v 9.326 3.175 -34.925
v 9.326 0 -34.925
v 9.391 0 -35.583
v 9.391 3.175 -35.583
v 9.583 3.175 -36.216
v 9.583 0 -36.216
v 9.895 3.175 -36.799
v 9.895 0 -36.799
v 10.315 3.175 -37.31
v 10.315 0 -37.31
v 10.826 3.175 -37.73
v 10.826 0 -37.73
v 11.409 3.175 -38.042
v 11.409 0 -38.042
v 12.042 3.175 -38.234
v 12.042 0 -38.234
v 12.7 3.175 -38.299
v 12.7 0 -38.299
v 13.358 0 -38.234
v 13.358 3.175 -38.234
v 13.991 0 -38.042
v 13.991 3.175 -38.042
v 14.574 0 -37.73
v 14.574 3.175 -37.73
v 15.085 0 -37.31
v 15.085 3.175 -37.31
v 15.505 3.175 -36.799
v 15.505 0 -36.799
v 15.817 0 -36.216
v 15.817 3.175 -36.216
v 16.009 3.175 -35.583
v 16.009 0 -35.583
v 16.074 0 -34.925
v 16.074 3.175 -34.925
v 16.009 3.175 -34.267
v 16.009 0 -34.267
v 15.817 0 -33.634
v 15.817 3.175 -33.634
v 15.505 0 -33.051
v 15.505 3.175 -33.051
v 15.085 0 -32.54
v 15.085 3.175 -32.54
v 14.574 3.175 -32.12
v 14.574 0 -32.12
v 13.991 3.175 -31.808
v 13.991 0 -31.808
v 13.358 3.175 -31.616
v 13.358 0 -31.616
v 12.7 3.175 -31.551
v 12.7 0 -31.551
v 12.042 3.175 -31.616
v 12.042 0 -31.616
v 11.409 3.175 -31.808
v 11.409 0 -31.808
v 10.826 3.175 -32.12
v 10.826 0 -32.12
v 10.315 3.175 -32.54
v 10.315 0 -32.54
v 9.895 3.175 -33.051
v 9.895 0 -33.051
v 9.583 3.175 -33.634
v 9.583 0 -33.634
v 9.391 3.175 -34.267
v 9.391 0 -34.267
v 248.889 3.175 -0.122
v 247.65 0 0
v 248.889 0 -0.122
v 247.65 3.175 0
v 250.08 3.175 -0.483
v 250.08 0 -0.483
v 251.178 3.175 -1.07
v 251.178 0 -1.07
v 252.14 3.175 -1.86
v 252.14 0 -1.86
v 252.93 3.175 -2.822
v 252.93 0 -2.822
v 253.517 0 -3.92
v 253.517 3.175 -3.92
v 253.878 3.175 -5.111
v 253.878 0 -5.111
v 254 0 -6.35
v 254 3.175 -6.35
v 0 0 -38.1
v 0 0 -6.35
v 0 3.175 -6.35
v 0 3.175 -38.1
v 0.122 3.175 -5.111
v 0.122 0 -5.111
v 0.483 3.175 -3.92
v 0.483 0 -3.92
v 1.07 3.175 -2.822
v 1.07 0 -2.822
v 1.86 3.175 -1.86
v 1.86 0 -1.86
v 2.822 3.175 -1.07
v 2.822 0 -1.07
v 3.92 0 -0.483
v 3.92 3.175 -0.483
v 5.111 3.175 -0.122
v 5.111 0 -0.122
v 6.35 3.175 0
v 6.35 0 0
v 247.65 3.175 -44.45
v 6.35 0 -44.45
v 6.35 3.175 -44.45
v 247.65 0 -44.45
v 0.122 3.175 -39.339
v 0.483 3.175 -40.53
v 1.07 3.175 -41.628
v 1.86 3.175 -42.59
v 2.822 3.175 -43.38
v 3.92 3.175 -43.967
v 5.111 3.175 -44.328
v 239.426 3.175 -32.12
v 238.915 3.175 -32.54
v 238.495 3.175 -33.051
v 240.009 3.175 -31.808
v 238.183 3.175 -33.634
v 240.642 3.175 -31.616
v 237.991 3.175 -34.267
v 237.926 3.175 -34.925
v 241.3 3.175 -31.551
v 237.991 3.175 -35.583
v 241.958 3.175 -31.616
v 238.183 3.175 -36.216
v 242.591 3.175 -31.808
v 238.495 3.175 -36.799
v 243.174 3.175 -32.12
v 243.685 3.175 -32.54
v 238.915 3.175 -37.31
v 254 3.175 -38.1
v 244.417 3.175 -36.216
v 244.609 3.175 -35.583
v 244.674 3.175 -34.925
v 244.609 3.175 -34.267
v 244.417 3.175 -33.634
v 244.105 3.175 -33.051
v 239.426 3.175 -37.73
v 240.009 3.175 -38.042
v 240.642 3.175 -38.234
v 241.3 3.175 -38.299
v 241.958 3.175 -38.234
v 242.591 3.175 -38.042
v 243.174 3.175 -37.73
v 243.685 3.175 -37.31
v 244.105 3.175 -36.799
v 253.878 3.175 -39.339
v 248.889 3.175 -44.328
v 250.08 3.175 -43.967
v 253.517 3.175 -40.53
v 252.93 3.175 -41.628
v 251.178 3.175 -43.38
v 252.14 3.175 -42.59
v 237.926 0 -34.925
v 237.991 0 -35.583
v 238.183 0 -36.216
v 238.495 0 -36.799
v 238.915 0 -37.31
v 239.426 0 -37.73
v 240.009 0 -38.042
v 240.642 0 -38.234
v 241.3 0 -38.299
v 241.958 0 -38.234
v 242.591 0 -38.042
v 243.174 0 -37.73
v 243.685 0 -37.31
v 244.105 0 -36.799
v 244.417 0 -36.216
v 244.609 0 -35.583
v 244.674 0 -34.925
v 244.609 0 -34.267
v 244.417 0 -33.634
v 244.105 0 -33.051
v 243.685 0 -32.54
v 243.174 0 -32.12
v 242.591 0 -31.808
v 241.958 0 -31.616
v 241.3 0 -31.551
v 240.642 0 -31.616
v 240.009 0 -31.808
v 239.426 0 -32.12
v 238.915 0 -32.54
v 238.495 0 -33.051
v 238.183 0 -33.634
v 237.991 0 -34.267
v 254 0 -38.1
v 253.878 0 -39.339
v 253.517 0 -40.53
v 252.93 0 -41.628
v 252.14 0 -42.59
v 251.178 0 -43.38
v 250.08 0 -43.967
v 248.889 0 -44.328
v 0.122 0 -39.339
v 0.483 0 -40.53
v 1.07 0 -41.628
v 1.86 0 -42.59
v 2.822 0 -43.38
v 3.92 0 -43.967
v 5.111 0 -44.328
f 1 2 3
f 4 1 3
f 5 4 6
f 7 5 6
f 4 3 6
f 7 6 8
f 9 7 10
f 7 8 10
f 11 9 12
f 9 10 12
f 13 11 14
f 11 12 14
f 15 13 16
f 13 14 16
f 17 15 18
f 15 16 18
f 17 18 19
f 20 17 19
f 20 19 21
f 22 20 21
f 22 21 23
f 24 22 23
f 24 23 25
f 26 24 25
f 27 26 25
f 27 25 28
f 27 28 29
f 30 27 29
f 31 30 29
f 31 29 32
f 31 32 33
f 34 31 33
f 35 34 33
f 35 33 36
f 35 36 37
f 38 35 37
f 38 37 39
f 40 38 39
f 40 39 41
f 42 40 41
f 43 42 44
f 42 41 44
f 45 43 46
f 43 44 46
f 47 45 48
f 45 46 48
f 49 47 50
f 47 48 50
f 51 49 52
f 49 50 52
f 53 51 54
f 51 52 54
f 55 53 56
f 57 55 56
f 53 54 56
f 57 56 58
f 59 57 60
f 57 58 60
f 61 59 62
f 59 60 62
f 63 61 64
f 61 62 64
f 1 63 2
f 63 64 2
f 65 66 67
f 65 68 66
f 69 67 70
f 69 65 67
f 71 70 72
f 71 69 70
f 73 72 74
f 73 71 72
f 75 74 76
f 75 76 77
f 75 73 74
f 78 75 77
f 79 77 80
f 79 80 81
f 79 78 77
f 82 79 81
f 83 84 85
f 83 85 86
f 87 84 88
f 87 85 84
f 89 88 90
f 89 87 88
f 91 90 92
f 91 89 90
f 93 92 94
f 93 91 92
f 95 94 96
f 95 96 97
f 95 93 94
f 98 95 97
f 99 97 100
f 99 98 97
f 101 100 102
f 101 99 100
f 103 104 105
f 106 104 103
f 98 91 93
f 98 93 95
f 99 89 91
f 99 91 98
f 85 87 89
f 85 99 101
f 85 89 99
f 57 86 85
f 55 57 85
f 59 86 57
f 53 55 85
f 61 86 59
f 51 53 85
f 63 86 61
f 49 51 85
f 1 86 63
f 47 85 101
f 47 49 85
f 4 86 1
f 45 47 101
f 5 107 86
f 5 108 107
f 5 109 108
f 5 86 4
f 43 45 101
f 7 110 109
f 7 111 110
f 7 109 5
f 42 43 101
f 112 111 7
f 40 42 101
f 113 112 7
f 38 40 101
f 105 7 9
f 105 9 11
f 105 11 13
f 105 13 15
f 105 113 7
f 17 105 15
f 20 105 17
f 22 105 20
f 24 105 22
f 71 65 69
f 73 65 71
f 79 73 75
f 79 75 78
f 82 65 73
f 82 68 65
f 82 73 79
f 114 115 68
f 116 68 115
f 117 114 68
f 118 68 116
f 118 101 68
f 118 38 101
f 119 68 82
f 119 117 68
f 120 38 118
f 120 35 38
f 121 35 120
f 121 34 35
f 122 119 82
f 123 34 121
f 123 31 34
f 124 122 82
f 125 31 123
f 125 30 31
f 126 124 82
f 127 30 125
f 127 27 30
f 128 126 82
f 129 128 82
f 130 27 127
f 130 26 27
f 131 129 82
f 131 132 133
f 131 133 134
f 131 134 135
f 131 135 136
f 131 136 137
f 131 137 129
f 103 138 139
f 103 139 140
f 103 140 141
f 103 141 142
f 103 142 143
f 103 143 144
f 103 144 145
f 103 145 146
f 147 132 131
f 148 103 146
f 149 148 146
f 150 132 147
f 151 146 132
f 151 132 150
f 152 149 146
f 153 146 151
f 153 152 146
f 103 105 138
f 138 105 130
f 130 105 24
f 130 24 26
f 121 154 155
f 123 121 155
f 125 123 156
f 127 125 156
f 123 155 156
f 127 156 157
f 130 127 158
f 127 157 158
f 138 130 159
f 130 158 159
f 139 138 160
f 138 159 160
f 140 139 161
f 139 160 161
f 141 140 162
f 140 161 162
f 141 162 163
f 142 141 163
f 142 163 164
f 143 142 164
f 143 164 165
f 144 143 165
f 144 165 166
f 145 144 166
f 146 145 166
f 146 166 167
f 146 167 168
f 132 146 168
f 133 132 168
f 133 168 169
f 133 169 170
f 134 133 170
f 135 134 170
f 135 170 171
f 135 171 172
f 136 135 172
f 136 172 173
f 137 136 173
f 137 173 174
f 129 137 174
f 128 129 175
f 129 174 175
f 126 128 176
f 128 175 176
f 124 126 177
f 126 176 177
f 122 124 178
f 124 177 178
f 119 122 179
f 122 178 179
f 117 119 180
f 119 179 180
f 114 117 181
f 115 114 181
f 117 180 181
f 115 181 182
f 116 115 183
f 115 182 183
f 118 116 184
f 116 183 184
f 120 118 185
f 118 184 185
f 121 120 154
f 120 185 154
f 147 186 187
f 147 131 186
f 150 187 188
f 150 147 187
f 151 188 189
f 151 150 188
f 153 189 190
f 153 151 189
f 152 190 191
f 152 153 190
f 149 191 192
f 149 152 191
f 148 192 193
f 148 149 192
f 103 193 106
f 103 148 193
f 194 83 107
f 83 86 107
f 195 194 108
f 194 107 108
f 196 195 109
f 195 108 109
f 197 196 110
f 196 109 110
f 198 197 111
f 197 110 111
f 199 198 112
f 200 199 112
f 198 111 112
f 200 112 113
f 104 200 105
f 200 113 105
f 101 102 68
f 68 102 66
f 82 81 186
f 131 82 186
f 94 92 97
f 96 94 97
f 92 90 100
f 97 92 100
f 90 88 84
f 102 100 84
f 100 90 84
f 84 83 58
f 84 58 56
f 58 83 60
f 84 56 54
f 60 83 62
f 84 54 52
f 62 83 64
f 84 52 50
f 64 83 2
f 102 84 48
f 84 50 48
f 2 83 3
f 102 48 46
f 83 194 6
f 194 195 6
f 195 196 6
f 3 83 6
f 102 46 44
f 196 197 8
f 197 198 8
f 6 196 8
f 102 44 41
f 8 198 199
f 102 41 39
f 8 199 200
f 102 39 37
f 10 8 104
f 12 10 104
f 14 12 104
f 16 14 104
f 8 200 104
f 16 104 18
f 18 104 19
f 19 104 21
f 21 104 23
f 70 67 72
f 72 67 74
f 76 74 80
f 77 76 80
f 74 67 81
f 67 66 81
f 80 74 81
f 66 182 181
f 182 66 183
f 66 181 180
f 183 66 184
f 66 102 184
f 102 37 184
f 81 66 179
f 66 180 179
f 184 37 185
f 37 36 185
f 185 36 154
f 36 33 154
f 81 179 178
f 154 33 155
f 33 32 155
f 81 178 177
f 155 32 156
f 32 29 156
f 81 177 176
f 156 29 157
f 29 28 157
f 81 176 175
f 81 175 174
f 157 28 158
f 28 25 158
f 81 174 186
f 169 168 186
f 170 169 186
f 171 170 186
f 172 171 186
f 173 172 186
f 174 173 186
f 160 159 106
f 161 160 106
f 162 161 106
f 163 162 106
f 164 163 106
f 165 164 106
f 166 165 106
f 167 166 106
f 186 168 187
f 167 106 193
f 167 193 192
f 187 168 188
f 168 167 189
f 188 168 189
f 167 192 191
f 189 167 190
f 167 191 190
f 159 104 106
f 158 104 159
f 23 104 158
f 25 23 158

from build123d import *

# Parameters (mm, degrees)
SKETCH1_W                        = 254
SKETCH1_H                        = 44.45
BOSS_EXTRUDE1_DEPTH              = 3.175
FILLET1_R                        = 6.35
F_17_64_0_26563_DIAMETER_HOLE1_D = 6.747002


with BuildPart() as part:
    # Sketch1 → Boss-Extrude1 (new body)
    with BuildSketch(Plane(origin=(0, 0, 0), x_dir=(1, 0, 0), z_dir=(0, 1, 0))):
        with Locations((127, 22.225)):
            Rectangle(SKETCH1_W, SKETCH1_H)
    extrude(amount=BOSS_EXTRUDE1_DEPTH)

    # Fillet1
    fillet1_edges = [part.edges().sort_by_distance(p)[0] for p in [
        (0, 1.5875, -44.45),
        (254, 1.5875, -44.45),
        (254, 1.5875, 0),
        (0, 1.5875, 0),
    ]]
    fillet(fillet1_edges, radius=FILLET1_R)

    # 17/64 (0.26563) Diameter Hole1 (through all)
    with Locations(Plane(origin=(0, 3.175, 0), x_dir=(1, 0, 0), z_dir=(0, 1, 0))):
        with Locations((12.7, 34.925), (241.3, 34.925)):
            Hole(F_17_64_0_26563_DIAMETER_HOLE1_D / 2)


solid = part.part
